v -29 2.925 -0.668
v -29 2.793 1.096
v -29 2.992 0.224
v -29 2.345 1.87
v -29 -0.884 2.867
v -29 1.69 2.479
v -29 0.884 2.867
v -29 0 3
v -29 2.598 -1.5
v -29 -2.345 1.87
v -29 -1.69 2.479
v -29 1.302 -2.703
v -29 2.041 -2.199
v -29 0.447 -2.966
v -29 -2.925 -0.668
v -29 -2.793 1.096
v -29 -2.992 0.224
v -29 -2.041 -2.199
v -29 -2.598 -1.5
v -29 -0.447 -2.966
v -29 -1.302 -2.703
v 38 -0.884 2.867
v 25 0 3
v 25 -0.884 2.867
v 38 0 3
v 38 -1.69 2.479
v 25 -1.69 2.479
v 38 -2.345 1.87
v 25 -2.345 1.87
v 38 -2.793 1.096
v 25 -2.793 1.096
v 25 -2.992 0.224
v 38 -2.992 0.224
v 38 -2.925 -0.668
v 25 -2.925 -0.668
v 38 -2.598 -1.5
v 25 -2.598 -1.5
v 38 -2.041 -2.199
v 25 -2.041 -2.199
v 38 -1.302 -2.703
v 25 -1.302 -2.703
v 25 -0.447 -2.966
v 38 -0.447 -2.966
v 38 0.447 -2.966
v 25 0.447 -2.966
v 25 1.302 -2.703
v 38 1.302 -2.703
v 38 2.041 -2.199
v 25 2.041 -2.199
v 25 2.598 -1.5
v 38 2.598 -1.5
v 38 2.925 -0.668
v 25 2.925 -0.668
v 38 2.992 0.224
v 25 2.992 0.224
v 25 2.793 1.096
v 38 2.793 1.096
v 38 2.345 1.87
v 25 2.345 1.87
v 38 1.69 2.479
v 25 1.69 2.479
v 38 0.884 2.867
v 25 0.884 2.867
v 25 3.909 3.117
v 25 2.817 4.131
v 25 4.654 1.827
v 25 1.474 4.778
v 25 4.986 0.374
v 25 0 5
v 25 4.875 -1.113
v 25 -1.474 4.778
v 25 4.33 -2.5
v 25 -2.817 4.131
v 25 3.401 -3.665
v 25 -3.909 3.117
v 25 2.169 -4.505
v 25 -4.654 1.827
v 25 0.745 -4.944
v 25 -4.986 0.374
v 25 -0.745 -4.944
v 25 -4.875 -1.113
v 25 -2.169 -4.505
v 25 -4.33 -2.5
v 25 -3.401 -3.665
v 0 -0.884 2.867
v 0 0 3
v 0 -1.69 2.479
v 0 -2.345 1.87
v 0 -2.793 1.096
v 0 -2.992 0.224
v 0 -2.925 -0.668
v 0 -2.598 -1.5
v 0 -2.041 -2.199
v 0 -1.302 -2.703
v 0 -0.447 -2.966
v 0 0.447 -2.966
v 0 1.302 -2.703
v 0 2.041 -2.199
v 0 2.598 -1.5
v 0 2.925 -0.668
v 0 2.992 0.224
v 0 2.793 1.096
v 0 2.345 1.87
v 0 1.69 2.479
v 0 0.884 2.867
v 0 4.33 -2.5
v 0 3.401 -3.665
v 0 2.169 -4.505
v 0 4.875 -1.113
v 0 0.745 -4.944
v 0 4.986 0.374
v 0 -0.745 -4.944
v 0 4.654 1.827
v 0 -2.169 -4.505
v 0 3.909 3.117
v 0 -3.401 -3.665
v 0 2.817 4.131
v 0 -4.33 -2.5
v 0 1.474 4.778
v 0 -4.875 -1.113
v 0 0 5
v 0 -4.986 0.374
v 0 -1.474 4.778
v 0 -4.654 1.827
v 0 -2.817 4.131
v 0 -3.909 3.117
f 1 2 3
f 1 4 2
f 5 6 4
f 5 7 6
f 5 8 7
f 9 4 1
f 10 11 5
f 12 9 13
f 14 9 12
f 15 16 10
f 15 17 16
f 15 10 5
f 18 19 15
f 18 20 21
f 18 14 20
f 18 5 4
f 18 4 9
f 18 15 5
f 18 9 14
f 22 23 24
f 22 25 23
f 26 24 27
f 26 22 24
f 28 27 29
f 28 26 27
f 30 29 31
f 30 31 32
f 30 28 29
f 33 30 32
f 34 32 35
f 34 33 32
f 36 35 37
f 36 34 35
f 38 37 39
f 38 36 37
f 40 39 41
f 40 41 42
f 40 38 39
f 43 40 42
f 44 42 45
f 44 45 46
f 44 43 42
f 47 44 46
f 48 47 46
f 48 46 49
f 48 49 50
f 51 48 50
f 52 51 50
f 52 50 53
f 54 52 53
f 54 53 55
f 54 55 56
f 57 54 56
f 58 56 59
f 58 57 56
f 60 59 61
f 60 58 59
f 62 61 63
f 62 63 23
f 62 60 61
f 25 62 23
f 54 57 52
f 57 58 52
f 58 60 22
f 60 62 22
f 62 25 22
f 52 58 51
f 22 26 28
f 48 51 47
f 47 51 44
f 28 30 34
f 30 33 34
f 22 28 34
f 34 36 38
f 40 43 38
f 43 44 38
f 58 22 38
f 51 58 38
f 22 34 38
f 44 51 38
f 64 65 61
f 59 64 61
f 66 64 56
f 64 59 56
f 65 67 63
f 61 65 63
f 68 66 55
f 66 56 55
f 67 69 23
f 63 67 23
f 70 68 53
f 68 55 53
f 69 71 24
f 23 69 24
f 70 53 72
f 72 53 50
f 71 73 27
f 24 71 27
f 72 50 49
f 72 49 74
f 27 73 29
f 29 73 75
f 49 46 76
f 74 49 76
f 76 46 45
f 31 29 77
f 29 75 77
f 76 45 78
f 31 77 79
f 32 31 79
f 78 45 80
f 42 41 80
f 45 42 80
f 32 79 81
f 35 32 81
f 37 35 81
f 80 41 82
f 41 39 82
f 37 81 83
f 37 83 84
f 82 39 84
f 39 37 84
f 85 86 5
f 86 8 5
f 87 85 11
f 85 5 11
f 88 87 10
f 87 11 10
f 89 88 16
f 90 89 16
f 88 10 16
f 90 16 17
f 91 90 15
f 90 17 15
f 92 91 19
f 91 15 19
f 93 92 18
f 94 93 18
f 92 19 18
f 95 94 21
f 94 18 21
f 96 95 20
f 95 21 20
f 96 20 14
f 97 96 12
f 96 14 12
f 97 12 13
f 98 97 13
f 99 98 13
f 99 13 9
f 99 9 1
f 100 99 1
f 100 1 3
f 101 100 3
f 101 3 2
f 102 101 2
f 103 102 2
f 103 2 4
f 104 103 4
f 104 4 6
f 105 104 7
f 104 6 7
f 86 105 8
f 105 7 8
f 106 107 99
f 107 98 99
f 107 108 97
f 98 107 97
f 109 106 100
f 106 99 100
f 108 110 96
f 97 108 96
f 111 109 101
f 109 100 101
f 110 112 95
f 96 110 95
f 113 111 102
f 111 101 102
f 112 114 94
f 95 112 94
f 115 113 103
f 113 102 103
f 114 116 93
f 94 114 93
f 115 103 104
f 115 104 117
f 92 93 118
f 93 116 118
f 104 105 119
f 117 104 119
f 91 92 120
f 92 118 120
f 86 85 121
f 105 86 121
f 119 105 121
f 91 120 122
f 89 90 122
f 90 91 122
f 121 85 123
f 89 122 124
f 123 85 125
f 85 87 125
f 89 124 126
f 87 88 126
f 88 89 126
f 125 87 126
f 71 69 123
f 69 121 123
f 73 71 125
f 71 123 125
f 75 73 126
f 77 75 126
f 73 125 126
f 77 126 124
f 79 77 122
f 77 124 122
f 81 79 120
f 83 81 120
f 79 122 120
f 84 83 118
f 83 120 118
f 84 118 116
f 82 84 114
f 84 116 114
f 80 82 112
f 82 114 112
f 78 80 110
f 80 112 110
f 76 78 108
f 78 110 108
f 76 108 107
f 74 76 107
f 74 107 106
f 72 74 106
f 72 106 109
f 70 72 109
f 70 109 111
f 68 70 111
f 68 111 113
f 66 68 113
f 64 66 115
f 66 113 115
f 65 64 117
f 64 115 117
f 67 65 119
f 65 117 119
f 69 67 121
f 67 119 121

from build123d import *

# Parameters (mm, degrees)
F0_W   = 23
F0_H   = 3
F0_W_2 = 6
F0_W_3 = 13


# Not quite as in the source:
# - a feature names something its author has since deleted; it is built from what else it names


with BuildPart() as f1:
    # F0 (on Front) → F1 (revolve)
    with BuildSketch(Plane.XZ):
        Polygon((25, 5), (0, 5), (0, 3), (0, 0), (25, 0), (25, 3), align=None)
        with Locations((-11.5, 1.5)):
            Rectangle(F0_W, F0_H)
        with Locations((-26, 1.5)):
            Rectangle(F0_W_2, F0_H)
        with Locations((31.5, 1.5)):
            Rectangle(F0_W_3, F0_H)
    revolve(axis=Axis((1, 0, 0), (1, 0, 0)))


solid = f1.part
